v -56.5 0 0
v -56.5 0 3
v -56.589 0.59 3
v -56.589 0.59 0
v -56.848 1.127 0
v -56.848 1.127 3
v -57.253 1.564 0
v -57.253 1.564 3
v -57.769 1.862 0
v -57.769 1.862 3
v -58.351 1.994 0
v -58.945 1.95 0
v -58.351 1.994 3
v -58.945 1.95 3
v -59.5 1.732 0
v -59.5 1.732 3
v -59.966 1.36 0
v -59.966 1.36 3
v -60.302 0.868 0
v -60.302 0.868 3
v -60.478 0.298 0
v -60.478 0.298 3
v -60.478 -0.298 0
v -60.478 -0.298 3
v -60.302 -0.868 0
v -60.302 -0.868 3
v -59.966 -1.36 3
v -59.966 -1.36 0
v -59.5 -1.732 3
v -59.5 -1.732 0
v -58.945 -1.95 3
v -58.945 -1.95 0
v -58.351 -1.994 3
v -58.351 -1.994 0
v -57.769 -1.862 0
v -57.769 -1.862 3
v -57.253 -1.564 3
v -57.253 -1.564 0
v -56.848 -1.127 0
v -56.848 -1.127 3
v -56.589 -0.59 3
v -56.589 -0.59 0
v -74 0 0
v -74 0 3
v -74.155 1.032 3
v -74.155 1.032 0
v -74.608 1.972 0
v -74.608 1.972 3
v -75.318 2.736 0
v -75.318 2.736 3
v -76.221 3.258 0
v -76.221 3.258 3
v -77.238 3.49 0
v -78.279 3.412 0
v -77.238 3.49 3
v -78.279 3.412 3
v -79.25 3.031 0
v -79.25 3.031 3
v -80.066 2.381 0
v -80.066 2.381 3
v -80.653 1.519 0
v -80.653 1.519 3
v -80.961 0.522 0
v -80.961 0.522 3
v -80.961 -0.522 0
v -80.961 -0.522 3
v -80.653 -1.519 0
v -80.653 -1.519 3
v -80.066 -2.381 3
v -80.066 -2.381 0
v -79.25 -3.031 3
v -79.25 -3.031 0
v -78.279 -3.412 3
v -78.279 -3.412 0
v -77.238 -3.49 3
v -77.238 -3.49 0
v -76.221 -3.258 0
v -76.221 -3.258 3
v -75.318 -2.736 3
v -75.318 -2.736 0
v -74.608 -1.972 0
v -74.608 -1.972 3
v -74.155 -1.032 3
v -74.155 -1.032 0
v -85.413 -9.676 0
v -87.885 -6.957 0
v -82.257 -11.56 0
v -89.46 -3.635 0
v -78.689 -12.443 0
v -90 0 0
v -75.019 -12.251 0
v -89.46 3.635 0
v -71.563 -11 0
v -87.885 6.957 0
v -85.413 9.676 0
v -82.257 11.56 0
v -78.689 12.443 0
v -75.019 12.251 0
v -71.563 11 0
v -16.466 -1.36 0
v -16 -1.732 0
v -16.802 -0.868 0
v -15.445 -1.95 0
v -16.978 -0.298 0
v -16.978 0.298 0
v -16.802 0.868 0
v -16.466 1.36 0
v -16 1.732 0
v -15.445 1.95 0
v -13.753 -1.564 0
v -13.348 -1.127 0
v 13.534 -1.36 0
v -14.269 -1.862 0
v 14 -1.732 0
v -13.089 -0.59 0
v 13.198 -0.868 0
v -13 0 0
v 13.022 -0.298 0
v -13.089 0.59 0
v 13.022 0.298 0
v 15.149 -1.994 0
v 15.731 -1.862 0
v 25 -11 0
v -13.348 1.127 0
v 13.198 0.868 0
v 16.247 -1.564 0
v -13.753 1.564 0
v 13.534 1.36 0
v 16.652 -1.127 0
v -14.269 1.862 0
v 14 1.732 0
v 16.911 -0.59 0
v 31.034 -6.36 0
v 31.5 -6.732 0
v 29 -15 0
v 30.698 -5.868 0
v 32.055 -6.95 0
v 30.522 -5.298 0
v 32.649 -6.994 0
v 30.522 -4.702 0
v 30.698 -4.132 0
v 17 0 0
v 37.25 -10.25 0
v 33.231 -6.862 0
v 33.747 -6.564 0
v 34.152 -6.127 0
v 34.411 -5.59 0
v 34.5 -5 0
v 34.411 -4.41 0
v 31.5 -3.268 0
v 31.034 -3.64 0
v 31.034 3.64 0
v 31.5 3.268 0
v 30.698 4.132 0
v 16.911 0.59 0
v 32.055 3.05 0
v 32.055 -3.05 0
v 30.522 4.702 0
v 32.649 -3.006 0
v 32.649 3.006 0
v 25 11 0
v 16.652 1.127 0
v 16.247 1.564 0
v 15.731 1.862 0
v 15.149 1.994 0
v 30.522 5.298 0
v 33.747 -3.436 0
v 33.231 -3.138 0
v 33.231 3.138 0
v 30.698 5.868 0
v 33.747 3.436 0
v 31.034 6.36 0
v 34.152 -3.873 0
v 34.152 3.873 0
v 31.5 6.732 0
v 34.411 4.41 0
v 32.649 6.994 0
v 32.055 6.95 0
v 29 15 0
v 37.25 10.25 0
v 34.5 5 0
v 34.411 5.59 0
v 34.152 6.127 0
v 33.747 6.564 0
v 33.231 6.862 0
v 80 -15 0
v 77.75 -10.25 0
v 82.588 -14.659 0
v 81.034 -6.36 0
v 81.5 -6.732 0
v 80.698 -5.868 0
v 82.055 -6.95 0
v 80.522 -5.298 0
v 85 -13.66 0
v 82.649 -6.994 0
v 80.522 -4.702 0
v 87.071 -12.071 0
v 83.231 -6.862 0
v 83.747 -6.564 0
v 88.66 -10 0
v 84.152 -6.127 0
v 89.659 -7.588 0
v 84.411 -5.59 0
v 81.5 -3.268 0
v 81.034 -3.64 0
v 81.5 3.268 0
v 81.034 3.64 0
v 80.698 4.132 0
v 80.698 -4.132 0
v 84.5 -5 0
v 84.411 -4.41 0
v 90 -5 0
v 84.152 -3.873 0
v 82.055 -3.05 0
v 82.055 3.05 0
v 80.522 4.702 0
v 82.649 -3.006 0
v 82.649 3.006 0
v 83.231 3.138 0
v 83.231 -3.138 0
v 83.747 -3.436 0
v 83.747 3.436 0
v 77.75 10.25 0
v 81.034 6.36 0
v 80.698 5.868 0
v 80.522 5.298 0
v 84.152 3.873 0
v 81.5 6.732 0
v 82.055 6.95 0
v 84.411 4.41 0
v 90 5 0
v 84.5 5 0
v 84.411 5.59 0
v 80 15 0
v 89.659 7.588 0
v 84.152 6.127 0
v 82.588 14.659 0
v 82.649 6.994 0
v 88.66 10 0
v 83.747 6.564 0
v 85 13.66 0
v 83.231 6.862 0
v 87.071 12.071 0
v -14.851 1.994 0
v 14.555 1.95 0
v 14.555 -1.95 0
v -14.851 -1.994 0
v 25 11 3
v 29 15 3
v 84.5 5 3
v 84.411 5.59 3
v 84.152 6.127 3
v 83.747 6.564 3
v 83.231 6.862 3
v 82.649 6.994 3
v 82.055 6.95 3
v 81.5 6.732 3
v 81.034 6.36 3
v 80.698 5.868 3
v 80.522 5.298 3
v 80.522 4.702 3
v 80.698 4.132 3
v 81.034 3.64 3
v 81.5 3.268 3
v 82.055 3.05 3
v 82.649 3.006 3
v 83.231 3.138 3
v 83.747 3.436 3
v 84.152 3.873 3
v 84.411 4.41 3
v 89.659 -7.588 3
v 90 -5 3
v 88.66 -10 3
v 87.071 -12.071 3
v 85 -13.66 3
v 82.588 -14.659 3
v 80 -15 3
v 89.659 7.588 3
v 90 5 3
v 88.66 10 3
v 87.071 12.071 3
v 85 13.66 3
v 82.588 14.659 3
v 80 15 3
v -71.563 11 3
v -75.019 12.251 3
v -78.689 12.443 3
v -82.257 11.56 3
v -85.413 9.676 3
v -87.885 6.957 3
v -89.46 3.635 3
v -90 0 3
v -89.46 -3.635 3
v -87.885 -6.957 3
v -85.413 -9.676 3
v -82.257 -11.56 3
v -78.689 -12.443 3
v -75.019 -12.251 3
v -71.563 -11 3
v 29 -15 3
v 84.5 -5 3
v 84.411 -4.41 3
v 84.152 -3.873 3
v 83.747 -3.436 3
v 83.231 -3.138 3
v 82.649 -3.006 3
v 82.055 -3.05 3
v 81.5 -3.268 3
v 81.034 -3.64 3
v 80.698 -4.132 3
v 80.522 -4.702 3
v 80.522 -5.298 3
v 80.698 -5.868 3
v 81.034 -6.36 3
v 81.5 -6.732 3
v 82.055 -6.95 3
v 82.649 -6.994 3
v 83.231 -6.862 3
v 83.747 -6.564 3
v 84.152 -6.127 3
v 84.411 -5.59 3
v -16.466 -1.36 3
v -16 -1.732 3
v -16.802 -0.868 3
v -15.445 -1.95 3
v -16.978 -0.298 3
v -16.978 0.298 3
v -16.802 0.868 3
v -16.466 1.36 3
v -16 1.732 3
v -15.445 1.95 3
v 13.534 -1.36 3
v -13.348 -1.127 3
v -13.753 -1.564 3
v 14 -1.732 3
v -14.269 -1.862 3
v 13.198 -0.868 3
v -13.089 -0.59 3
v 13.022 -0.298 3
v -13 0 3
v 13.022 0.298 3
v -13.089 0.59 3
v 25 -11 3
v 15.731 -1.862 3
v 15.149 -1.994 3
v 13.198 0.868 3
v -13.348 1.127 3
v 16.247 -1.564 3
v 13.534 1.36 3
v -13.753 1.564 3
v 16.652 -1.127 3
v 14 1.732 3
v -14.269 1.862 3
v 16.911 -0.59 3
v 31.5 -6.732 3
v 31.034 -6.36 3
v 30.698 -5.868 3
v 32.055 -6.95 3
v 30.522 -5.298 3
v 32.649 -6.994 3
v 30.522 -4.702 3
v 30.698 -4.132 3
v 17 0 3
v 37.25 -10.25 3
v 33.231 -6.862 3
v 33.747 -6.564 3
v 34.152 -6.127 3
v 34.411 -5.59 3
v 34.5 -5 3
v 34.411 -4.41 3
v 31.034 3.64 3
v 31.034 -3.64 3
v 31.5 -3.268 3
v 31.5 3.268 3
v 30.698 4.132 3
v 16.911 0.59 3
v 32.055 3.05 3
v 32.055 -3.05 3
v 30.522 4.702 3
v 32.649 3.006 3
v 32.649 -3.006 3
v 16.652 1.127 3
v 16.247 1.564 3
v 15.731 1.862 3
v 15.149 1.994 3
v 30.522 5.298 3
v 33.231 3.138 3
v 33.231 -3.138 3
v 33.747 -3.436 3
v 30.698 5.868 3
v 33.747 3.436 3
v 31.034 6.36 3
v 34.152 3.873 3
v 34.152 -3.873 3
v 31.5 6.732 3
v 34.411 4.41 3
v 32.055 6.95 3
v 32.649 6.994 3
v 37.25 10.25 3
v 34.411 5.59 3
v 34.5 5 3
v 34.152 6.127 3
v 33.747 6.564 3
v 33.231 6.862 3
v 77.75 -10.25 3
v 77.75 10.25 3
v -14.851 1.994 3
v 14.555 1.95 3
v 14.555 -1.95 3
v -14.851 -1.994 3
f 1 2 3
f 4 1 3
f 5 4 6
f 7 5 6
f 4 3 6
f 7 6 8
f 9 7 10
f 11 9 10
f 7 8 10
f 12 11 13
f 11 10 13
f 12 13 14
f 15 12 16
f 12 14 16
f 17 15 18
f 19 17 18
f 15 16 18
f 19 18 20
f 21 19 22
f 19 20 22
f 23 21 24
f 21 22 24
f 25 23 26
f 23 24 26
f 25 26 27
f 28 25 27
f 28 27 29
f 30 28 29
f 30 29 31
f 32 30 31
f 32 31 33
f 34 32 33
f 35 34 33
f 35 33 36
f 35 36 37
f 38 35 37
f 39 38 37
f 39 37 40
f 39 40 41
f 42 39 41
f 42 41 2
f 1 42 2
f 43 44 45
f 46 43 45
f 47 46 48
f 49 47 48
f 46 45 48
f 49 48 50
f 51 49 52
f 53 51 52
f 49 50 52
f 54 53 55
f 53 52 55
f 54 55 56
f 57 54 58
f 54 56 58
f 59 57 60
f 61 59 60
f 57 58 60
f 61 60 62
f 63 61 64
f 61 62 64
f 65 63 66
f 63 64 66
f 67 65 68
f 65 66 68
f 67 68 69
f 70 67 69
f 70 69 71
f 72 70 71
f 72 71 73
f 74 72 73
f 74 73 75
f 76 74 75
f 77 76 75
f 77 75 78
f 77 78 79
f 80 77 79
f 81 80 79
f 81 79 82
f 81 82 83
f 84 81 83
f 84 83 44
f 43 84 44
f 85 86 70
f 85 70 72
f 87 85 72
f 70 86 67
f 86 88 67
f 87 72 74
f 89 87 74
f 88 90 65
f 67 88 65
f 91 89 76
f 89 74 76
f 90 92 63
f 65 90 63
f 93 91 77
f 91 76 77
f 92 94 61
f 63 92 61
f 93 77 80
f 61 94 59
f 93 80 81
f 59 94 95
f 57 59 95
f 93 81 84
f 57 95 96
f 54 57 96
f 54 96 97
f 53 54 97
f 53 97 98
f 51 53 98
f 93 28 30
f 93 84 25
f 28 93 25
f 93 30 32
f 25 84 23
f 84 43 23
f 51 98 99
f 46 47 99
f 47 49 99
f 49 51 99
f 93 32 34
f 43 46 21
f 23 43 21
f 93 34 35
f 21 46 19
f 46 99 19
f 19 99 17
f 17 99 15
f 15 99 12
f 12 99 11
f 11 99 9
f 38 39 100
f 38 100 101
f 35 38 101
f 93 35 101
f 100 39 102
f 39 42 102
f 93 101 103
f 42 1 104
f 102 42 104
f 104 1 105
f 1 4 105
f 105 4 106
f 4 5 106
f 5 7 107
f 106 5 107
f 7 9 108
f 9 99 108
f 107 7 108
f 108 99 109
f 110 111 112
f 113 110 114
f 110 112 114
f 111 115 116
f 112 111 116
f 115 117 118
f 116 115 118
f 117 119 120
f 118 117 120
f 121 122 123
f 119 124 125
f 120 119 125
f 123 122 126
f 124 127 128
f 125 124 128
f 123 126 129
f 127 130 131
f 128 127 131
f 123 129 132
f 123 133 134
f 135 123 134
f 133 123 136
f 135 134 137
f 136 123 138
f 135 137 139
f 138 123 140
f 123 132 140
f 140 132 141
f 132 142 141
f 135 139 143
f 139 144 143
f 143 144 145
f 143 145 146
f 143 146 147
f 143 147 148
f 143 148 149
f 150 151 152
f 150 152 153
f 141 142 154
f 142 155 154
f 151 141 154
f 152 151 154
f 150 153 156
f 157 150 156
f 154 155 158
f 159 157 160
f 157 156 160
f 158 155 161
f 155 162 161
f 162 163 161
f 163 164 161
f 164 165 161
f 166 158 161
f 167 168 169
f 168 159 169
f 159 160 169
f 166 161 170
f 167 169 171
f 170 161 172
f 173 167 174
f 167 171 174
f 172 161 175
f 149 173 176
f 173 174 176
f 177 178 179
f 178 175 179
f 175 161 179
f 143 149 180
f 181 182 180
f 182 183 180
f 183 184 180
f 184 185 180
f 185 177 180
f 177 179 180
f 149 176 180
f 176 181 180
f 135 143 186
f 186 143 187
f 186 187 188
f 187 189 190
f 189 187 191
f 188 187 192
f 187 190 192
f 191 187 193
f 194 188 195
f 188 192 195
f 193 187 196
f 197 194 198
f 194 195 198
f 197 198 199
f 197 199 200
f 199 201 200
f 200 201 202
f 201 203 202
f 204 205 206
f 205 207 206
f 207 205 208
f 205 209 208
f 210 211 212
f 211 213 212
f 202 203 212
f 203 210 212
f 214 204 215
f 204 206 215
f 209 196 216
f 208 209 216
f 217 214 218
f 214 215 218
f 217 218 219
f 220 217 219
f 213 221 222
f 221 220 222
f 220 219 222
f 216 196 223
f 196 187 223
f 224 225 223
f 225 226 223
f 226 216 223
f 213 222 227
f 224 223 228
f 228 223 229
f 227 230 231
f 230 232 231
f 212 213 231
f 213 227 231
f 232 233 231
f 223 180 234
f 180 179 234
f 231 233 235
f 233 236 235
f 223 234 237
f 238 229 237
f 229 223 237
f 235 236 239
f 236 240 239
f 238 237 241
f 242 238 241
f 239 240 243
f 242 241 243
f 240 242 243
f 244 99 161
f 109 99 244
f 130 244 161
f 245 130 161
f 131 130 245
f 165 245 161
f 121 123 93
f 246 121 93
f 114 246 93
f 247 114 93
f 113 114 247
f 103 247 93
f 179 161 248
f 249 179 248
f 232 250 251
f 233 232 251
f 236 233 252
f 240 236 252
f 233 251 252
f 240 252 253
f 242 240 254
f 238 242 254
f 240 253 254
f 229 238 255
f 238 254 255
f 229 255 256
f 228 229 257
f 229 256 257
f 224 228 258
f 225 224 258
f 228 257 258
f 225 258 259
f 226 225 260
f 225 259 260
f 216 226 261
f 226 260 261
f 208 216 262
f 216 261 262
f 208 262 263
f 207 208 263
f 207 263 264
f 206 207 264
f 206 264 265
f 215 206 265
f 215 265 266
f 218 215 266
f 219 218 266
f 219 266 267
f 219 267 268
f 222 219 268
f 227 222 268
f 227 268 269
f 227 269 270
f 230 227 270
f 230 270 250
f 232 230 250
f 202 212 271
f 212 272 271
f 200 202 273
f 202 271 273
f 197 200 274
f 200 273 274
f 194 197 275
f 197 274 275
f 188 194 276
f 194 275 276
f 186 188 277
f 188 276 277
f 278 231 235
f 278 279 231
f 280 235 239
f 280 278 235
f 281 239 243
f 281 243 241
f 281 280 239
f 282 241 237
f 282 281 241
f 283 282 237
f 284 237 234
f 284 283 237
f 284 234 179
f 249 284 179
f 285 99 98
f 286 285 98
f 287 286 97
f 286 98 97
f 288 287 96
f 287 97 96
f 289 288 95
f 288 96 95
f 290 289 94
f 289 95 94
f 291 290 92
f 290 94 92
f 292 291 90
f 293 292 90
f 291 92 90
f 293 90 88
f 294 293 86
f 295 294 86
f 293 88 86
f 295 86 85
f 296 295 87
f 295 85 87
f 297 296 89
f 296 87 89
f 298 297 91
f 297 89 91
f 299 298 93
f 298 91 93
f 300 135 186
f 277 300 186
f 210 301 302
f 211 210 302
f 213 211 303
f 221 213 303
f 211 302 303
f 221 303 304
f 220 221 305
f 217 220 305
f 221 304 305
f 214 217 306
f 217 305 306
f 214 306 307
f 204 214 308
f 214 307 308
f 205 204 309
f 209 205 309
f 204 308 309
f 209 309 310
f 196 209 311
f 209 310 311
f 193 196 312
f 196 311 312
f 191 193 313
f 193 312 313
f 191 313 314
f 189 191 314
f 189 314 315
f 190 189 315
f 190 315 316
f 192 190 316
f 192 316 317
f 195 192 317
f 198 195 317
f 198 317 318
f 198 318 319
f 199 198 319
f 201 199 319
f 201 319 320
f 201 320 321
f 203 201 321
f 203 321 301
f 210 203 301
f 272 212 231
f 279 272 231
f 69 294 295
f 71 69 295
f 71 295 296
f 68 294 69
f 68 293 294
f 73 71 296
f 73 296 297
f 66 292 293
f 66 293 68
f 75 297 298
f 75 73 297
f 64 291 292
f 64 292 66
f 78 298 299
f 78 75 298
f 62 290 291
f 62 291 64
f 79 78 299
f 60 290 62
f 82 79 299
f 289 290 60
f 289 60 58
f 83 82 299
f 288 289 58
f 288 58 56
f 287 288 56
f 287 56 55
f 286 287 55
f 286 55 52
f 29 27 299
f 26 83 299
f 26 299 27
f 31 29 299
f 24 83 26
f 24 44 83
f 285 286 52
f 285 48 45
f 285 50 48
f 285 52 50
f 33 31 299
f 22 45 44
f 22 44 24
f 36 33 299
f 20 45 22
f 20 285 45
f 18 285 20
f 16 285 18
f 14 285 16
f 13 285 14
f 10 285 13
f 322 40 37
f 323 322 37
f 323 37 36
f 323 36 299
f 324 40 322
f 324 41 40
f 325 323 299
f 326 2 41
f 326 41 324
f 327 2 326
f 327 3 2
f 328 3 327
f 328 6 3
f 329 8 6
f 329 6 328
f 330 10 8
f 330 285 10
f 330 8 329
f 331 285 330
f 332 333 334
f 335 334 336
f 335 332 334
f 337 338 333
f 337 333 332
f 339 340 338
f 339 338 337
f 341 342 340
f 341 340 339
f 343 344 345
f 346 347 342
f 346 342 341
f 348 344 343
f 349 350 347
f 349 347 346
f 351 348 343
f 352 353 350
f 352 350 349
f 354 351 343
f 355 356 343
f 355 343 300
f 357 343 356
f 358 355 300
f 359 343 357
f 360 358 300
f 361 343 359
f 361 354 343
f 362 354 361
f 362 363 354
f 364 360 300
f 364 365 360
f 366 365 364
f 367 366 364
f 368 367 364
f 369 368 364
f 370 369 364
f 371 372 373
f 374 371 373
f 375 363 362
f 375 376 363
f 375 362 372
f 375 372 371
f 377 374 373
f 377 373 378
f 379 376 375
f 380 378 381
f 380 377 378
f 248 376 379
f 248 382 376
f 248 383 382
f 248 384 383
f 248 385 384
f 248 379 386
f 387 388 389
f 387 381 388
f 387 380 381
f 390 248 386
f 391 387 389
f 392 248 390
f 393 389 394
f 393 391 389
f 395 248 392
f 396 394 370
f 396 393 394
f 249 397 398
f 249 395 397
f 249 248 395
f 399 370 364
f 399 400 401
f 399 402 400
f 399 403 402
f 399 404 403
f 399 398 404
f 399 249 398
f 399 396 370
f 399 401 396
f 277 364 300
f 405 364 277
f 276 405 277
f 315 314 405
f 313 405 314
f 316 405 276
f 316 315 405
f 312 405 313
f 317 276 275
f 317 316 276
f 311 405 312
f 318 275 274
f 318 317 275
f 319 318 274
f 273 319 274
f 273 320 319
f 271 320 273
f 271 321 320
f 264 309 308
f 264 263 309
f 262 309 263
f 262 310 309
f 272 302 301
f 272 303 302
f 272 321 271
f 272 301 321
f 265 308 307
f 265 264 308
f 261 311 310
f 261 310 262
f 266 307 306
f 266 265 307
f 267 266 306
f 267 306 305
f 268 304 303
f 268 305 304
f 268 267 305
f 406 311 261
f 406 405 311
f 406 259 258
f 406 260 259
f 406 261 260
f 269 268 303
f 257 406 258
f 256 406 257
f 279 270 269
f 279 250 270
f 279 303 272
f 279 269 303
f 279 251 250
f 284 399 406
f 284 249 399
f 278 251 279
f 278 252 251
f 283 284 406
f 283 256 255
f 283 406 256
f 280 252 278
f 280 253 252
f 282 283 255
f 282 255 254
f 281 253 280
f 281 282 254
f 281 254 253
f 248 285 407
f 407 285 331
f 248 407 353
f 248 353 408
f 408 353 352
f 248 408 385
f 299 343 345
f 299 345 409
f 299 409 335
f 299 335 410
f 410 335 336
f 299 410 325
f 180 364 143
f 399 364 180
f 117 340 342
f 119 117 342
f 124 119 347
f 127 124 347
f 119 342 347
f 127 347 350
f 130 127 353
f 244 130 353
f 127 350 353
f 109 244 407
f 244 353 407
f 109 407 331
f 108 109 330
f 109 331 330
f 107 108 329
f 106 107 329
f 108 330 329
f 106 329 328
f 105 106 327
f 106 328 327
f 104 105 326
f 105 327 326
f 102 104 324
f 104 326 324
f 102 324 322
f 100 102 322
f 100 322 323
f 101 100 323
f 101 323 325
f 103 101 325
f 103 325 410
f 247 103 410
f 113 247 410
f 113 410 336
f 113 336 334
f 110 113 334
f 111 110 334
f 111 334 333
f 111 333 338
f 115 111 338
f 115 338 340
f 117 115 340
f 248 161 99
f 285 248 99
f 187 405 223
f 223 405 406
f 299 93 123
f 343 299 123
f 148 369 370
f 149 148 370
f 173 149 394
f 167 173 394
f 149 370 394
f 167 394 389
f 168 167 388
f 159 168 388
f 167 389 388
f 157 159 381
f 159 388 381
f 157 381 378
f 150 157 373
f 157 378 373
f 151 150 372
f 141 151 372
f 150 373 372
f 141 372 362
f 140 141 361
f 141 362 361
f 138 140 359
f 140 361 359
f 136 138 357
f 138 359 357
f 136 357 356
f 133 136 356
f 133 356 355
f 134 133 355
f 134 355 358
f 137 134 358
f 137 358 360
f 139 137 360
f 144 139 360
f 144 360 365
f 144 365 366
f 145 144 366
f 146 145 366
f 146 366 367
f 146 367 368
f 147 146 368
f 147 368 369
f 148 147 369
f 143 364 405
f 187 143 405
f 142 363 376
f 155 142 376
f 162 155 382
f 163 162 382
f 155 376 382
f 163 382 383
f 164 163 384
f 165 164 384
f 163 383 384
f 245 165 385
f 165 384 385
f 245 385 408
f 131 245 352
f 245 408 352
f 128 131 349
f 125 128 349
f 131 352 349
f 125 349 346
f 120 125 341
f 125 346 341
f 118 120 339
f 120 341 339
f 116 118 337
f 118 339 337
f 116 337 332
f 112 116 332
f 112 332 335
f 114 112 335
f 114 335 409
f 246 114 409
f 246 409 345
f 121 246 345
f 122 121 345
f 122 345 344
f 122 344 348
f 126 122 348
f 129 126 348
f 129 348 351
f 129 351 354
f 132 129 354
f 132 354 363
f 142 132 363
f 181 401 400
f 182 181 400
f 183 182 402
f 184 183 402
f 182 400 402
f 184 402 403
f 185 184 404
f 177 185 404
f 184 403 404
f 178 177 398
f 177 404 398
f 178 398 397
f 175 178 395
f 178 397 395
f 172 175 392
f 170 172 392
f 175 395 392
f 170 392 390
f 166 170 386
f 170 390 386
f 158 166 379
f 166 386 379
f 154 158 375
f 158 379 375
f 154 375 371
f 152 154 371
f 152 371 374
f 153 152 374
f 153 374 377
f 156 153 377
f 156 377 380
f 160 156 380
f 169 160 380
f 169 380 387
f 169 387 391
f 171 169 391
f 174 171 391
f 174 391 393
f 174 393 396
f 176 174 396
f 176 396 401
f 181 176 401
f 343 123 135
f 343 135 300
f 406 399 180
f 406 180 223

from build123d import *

# Parameters (mm, degrees)
SALIENTE_EXTRUIR1_DEPTH = 3
REDONDEO1_R             = 10
CHAFL_N1_SIZE           = 4
CORTAR_EXTRUIR1_REACH   = 93.291
CROQUIS2_R              = 2
CROQUIS2_W              = 40.5
CROQUIS2_H              = 20.5
CORTAR_EXTRUIR2_REACH   = 93.291
CROQUIS3_R              = 3.5
CROQUIS3_R_2            = 2
CORTAR_EXTRUIR3_REACH   = 93.291
CROQUIS4_R              = 2


with BuildPart() as part:
    # Croquis1 → Saliente-Extruir1 (new body)
    with BuildSketch(Plane.XY):
        with BuildLine():
            Line((90, -15), (90, 15))
            Line((90, 15), (25, 15))
            Line((25, 15), (25, 11))
            Line((25, 11), (-25, 11))
            Line((-25, 11), (-71.562828956, 11))
            ThreePointArc((-71.562828956, 11), (-90, 0), (-71.562828956, -11))
            Line((-71.562828956, -11), (-25, -11))
            Line((-25, -11), (25, -11))
            Line((25, -11), (25, -15))
            Line((25, -15), (90, -15))
        make_face()
    extrude(amount=SALIENTE_EXTRUIR1_DEPTH)

    # Redondeo1
    redondeo1_edges = [part.edges().sort_by_distance(p)[0] for p in [
        (90, 15, 1.5),
        (90, -15, 1.5),
    ]]
    fillet(redondeo1_edges, radius=REDONDEO1_R)

    # Chaflán1
    chafl_n1_edges = [part.edges().sort_by_distance(p)[0] for p in [
        (25, -15, 1.5),
        (25, 15, 1.5),
    ]]
    chamfer(chafl_n1_edges, length=CHAFL_N1_SIZE - 0.0001)  # a hair under: the kernel refuses the full size

    # Croquis2 → Cortar-Extruir1 (cut, up to next)
    with BuildSketch(Plane.XY.offset(3), mode=Mode.PRIVATE) as cortar_extruir1_sk1:
        with Locations((82.5, 5)):
            Circle(CROQUIS2_R)
    cortar_extruir1_tool1 = extrude(cortar_extruir1_sk1.sketch, amount=-CORTAR_EXTRUIR1_REACH, mode=Mode.PRIVATE) & part.part
    # Croquis2 → Cortar-Extruir1 (cut, up to next)
    with BuildSketch(Plane.XY.offset(3), mode=Mode.PRIVATE) as cortar_extruir1_sk2:
        with Locations((32.5, 5)):
            Circle(CROQUIS2_R)
    cortar_extruir1_tool2 = extrude(cortar_extruir1_sk2.sketch, amount=-CORTAR_EXTRUIR1_REACH, mode=Mode.PRIVATE) & part.part
    # Croquis2 → Cortar-Extruir1 (cut, up to next)
    with BuildSketch(Plane.XY.offset(3), mode=Mode.PRIVATE) as cortar_extruir1_sk3:
        with Locations((82.5, -5)):
            Circle(CROQUIS2_R)
    cortar_extruir1_tool3 = extrude(cortar_extruir1_sk3.sketch, amount=-CORTAR_EXTRUIR1_REACH, mode=Mode.PRIVATE) & part.part
    # Croquis2 → Cortar-Extruir1 (cut, up to next)
    with BuildSketch(Plane.XY.offset(3), mode=Mode.PRIVATE) as cortar_extruir1_sk4:
        with Locations((32.5, -5)):
            Circle(CROQUIS2_R)
    cortar_extruir1_tool4 = extrude(cortar_extruir1_sk4.sketch, amount=-CORTAR_EXTRUIR1_REACH, mode=Mode.PRIVATE) & part.part
    # Croquis2 → Cortar-Extruir1 (cut, up to next)
    with BuildSketch(Plane.XY.offset(3), mode=Mode.PRIVATE) as cortar_extruir1_sk5:
        with Locations((57.5, 0)):
            Rectangle(CROQUIS2_W, CROQUIS2_H)
    cortar_extruir1_tool5 = extrude(cortar_extruir1_sk5.sketch, amount=-CORTAR_EXTRUIR1_REACH, mode=Mode.PRIVATE) & part.part
    add(cortar_extruir1_tool1.solids().sort_by_distance((82.5, 5, 3))[0], mode=Mode.SUBTRACT)
    add(cortar_extruir1_tool2.solids().sort_by_distance((32.5, 5, 3))[0], mode=Mode.SUBTRACT)
    add(cortar_extruir1_tool3.solids().sort_by_distance((82.5, -5, 3))[0], mode=Mode.SUBTRACT)
    add(cortar_extruir1_tool4.solids().sort_by_distance((32.5, -5, 3))[0], mode=Mode.SUBTRACT)
    add(cortar_extruir1_tool5.solids().sort_by_distance((57.5, 0, 3))[0], mode=Mode.SUBTRACT)

    # Croquis3 → Cortar-Extruir2 (cut, up to next)
    with BuildSketch(Plane.XY.offset(3), mode=Mode.PRIVATE) as cortar_extruir2_sk1:
        with Locations((-77.5, 0)):
            Circle(CROQUIS3_R)
    cortar_extruir2_tool1 = extrude(cortar_extruir2_sk1.sketch, amount=-CORTAR_EXTRUIR2_REACH, mode=Mode.PRIVATE) & part.part
    # Croquis3 → Cortar-Extruir2 (cut, up to next)
    with BuildSketch(Plane.XY.offset(3), mode=Mode.PRIVATE) as cortar_extruir2_sk2:
        with Locations((-58.5, 0)):
            Circle(CROQUIS3_R_2)
    cortar_extruir2_tool2 = extrude(cortar_extruir2_sk2.sketch, amount=-CORTAR_EXTRUIR2_REACH, mode=Mode.PRIVATE) & part.part
    add(cortar_extruir2_tool1.solids().sort_by_distance((-77.5, 0, 3))[0], mode=Mode.SUBTRACT)
    add(cortar_extruir2_tool2.solids().sort_by_distance((-58.5, 0, 3))[0], mode=Mode.SUBTRACT)

    # Croquis4 → Cortar-Extruir3 (cut, up to next)
    with BuildSketch(Plane.XY.offset(3), mode=Mode.PRIVATE) as cortar_extruir3_sk1:
        with Locations((-15, 0)):
            Circle(CROQUIS4_R)
    cortar_extruir3_tool1 = extrude(cortar_extruir3_sk1.sketch, amount=-CORTAR_EXTRUIR3_REACH, mode=Mode.PRIVATE) & part.part
    # Croquis4 → Cortar-Extruir3 (cut, up to next)
    with BuildSketch(Plane.XY.offset(3), mode=Mode.PRIVATE) as cortar_extruir3_sk2:
        with Locations((15, 0)):
            Circle(CROQUIS4_R)
    cortar_extruir3_tool2 = extrude(cortar_extruir3_sk2.sketch, amount=-CORTAR_EXTRUIR3_REACH, mode=Mode.PRIVATE) & part.part
    add(cortar_extruir3_tool1.solids().sort_by_distance((-15, 0, 3))[0], mode=Mode.SUBTRACT)
    add(cortar_extruir3_tool2.solids().sort_by_distance((15, 0, 3))[0], mode=Mode.SUBTRACT)


solid = part.part
